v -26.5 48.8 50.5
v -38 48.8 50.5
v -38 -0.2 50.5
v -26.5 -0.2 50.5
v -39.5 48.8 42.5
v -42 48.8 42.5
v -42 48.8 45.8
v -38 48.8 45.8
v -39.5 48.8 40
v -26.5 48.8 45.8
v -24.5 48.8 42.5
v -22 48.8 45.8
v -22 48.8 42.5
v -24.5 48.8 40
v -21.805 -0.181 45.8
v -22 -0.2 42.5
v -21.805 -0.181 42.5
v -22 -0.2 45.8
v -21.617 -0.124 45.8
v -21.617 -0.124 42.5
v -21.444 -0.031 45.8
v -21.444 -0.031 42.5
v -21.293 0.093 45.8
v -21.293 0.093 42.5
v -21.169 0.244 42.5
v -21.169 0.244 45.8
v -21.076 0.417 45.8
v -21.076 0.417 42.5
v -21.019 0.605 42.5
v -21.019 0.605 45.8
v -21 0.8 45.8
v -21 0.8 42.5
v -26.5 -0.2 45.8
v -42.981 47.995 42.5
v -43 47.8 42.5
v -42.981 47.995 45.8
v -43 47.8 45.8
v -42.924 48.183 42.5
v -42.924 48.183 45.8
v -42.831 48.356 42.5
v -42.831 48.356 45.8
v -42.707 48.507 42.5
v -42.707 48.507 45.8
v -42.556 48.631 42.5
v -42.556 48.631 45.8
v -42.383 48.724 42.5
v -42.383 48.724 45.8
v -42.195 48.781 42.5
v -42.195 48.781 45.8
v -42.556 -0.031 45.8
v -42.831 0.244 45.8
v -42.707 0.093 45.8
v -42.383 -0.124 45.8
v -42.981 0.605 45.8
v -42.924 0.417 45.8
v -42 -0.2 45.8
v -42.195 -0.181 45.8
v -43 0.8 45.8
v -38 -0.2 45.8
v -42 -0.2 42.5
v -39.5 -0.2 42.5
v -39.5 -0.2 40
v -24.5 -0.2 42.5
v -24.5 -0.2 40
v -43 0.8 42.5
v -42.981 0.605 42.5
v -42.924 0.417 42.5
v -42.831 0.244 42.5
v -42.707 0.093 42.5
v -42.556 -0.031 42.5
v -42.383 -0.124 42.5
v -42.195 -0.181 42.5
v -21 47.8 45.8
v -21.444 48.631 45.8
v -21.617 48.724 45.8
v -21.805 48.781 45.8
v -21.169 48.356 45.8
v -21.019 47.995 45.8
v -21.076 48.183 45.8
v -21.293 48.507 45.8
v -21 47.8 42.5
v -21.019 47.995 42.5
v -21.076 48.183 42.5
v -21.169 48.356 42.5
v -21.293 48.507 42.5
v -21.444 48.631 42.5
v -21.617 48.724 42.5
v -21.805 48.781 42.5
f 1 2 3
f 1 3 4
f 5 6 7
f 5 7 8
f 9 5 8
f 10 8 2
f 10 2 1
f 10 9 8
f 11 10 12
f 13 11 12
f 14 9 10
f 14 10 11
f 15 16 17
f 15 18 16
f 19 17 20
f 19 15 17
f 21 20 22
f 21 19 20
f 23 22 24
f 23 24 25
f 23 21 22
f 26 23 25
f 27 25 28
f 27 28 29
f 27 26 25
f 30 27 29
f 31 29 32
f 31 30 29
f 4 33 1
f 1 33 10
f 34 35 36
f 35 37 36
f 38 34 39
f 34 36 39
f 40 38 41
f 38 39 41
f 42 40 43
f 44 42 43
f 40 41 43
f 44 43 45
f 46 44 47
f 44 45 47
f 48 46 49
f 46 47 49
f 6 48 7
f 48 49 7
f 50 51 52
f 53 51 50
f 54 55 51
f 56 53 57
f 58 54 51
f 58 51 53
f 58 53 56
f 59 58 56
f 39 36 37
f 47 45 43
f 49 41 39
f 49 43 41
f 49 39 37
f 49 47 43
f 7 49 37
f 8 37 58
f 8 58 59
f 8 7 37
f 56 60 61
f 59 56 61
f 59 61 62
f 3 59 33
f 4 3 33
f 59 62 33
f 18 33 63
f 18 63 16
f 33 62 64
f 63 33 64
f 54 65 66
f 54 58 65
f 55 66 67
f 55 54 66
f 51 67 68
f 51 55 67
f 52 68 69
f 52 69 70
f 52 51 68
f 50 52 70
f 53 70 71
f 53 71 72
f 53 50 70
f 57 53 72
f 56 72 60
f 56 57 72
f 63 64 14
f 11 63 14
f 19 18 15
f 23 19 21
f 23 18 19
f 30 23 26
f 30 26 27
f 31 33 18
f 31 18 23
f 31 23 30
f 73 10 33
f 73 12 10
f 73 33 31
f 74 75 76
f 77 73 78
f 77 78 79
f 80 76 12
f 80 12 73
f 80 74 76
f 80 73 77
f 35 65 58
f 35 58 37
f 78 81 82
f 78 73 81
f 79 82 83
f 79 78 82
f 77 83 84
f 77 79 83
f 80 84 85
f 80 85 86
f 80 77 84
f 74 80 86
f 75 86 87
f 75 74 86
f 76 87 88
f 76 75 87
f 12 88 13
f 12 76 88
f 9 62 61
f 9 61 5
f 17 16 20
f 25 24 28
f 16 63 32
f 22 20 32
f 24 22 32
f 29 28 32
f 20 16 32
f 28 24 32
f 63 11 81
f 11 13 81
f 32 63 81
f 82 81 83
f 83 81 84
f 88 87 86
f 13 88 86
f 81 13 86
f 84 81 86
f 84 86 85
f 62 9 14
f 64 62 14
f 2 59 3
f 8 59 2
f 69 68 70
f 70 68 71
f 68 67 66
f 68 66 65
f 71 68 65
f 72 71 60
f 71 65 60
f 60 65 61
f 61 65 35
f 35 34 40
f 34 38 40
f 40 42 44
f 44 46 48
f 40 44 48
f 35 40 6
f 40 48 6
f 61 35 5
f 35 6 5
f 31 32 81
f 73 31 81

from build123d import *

# Parameters (mm, degrees)
BOX011_W     = 11.5
BOX011_H     = 49
BOX011_DEPTH = 8
BOX010_W     = 22
BOX010_H     = 49
BOX010_DEPTH = 3.3
FILLET006_R  = 1
BOX012_W     = 15
BOX012_H     = 49
BOX012_DEPTH = 3


with BuildPart() as box011:
    # Box011 → Box011 (new body)
    with BuildSketch(Plane(origin=(-38, -0.2, 84.5), x_dir=(1, 0, 0), z_dir=(0, 0, 1))):
        with Locations((5.75, 24.5)):
            Rectangle(BOX011_W, BOX011_H)
    extrude(amount=BOX011_DEPTH)


with BuildPart() as fillet006:
    # Box010 → Box010 (new body)
    with BuildSketch(Plane(origin=(-43, -0.2, 84.5), x_dir=(1, 0, 0), z_dir=(0, 0, 1))):
        with Locations((11, 24.5)):
            Rectangle(BOX010_W, BOX010_H)
    extrude(amount=BOX010_DEPTH)

    # Fillet006
    fillet006_edges = [fillet006.edges().sort_by_distance(p)[0] for p in [
        (-43, -0.2, 86.15),
        (-43, 48.8, 86.15),
        (-21, -0.2, 86.15),
        (-21, 48.8, 86.15),
    ]]
    fillet(fillet006_edges, radius=FILLET006_R)


with BuildPart() as fusion002007:
    # Box012 → Box012 (new body)
    with BuildSketch(Plane(origin=(-39.5, -0.2, 82), x_dir=(1, 0, 0), z_dir=(0, 0, 1))):
        with Locations((7.5, 24.5)):
            Rectangle(BOX012_W, BOX012_H)
    extrude(amount=BOX012_DEPTH)

    # Fusion002007: union Box011, Fillet006
    add(box011.part)
    add(fillet006.part)


with BuildPart() as fusion002007_1:
    # Fusion002007 placement: moved
    add(fusion002007.part.moved(Location((0, 0, -42))))


solid = fusion002007_1.part
